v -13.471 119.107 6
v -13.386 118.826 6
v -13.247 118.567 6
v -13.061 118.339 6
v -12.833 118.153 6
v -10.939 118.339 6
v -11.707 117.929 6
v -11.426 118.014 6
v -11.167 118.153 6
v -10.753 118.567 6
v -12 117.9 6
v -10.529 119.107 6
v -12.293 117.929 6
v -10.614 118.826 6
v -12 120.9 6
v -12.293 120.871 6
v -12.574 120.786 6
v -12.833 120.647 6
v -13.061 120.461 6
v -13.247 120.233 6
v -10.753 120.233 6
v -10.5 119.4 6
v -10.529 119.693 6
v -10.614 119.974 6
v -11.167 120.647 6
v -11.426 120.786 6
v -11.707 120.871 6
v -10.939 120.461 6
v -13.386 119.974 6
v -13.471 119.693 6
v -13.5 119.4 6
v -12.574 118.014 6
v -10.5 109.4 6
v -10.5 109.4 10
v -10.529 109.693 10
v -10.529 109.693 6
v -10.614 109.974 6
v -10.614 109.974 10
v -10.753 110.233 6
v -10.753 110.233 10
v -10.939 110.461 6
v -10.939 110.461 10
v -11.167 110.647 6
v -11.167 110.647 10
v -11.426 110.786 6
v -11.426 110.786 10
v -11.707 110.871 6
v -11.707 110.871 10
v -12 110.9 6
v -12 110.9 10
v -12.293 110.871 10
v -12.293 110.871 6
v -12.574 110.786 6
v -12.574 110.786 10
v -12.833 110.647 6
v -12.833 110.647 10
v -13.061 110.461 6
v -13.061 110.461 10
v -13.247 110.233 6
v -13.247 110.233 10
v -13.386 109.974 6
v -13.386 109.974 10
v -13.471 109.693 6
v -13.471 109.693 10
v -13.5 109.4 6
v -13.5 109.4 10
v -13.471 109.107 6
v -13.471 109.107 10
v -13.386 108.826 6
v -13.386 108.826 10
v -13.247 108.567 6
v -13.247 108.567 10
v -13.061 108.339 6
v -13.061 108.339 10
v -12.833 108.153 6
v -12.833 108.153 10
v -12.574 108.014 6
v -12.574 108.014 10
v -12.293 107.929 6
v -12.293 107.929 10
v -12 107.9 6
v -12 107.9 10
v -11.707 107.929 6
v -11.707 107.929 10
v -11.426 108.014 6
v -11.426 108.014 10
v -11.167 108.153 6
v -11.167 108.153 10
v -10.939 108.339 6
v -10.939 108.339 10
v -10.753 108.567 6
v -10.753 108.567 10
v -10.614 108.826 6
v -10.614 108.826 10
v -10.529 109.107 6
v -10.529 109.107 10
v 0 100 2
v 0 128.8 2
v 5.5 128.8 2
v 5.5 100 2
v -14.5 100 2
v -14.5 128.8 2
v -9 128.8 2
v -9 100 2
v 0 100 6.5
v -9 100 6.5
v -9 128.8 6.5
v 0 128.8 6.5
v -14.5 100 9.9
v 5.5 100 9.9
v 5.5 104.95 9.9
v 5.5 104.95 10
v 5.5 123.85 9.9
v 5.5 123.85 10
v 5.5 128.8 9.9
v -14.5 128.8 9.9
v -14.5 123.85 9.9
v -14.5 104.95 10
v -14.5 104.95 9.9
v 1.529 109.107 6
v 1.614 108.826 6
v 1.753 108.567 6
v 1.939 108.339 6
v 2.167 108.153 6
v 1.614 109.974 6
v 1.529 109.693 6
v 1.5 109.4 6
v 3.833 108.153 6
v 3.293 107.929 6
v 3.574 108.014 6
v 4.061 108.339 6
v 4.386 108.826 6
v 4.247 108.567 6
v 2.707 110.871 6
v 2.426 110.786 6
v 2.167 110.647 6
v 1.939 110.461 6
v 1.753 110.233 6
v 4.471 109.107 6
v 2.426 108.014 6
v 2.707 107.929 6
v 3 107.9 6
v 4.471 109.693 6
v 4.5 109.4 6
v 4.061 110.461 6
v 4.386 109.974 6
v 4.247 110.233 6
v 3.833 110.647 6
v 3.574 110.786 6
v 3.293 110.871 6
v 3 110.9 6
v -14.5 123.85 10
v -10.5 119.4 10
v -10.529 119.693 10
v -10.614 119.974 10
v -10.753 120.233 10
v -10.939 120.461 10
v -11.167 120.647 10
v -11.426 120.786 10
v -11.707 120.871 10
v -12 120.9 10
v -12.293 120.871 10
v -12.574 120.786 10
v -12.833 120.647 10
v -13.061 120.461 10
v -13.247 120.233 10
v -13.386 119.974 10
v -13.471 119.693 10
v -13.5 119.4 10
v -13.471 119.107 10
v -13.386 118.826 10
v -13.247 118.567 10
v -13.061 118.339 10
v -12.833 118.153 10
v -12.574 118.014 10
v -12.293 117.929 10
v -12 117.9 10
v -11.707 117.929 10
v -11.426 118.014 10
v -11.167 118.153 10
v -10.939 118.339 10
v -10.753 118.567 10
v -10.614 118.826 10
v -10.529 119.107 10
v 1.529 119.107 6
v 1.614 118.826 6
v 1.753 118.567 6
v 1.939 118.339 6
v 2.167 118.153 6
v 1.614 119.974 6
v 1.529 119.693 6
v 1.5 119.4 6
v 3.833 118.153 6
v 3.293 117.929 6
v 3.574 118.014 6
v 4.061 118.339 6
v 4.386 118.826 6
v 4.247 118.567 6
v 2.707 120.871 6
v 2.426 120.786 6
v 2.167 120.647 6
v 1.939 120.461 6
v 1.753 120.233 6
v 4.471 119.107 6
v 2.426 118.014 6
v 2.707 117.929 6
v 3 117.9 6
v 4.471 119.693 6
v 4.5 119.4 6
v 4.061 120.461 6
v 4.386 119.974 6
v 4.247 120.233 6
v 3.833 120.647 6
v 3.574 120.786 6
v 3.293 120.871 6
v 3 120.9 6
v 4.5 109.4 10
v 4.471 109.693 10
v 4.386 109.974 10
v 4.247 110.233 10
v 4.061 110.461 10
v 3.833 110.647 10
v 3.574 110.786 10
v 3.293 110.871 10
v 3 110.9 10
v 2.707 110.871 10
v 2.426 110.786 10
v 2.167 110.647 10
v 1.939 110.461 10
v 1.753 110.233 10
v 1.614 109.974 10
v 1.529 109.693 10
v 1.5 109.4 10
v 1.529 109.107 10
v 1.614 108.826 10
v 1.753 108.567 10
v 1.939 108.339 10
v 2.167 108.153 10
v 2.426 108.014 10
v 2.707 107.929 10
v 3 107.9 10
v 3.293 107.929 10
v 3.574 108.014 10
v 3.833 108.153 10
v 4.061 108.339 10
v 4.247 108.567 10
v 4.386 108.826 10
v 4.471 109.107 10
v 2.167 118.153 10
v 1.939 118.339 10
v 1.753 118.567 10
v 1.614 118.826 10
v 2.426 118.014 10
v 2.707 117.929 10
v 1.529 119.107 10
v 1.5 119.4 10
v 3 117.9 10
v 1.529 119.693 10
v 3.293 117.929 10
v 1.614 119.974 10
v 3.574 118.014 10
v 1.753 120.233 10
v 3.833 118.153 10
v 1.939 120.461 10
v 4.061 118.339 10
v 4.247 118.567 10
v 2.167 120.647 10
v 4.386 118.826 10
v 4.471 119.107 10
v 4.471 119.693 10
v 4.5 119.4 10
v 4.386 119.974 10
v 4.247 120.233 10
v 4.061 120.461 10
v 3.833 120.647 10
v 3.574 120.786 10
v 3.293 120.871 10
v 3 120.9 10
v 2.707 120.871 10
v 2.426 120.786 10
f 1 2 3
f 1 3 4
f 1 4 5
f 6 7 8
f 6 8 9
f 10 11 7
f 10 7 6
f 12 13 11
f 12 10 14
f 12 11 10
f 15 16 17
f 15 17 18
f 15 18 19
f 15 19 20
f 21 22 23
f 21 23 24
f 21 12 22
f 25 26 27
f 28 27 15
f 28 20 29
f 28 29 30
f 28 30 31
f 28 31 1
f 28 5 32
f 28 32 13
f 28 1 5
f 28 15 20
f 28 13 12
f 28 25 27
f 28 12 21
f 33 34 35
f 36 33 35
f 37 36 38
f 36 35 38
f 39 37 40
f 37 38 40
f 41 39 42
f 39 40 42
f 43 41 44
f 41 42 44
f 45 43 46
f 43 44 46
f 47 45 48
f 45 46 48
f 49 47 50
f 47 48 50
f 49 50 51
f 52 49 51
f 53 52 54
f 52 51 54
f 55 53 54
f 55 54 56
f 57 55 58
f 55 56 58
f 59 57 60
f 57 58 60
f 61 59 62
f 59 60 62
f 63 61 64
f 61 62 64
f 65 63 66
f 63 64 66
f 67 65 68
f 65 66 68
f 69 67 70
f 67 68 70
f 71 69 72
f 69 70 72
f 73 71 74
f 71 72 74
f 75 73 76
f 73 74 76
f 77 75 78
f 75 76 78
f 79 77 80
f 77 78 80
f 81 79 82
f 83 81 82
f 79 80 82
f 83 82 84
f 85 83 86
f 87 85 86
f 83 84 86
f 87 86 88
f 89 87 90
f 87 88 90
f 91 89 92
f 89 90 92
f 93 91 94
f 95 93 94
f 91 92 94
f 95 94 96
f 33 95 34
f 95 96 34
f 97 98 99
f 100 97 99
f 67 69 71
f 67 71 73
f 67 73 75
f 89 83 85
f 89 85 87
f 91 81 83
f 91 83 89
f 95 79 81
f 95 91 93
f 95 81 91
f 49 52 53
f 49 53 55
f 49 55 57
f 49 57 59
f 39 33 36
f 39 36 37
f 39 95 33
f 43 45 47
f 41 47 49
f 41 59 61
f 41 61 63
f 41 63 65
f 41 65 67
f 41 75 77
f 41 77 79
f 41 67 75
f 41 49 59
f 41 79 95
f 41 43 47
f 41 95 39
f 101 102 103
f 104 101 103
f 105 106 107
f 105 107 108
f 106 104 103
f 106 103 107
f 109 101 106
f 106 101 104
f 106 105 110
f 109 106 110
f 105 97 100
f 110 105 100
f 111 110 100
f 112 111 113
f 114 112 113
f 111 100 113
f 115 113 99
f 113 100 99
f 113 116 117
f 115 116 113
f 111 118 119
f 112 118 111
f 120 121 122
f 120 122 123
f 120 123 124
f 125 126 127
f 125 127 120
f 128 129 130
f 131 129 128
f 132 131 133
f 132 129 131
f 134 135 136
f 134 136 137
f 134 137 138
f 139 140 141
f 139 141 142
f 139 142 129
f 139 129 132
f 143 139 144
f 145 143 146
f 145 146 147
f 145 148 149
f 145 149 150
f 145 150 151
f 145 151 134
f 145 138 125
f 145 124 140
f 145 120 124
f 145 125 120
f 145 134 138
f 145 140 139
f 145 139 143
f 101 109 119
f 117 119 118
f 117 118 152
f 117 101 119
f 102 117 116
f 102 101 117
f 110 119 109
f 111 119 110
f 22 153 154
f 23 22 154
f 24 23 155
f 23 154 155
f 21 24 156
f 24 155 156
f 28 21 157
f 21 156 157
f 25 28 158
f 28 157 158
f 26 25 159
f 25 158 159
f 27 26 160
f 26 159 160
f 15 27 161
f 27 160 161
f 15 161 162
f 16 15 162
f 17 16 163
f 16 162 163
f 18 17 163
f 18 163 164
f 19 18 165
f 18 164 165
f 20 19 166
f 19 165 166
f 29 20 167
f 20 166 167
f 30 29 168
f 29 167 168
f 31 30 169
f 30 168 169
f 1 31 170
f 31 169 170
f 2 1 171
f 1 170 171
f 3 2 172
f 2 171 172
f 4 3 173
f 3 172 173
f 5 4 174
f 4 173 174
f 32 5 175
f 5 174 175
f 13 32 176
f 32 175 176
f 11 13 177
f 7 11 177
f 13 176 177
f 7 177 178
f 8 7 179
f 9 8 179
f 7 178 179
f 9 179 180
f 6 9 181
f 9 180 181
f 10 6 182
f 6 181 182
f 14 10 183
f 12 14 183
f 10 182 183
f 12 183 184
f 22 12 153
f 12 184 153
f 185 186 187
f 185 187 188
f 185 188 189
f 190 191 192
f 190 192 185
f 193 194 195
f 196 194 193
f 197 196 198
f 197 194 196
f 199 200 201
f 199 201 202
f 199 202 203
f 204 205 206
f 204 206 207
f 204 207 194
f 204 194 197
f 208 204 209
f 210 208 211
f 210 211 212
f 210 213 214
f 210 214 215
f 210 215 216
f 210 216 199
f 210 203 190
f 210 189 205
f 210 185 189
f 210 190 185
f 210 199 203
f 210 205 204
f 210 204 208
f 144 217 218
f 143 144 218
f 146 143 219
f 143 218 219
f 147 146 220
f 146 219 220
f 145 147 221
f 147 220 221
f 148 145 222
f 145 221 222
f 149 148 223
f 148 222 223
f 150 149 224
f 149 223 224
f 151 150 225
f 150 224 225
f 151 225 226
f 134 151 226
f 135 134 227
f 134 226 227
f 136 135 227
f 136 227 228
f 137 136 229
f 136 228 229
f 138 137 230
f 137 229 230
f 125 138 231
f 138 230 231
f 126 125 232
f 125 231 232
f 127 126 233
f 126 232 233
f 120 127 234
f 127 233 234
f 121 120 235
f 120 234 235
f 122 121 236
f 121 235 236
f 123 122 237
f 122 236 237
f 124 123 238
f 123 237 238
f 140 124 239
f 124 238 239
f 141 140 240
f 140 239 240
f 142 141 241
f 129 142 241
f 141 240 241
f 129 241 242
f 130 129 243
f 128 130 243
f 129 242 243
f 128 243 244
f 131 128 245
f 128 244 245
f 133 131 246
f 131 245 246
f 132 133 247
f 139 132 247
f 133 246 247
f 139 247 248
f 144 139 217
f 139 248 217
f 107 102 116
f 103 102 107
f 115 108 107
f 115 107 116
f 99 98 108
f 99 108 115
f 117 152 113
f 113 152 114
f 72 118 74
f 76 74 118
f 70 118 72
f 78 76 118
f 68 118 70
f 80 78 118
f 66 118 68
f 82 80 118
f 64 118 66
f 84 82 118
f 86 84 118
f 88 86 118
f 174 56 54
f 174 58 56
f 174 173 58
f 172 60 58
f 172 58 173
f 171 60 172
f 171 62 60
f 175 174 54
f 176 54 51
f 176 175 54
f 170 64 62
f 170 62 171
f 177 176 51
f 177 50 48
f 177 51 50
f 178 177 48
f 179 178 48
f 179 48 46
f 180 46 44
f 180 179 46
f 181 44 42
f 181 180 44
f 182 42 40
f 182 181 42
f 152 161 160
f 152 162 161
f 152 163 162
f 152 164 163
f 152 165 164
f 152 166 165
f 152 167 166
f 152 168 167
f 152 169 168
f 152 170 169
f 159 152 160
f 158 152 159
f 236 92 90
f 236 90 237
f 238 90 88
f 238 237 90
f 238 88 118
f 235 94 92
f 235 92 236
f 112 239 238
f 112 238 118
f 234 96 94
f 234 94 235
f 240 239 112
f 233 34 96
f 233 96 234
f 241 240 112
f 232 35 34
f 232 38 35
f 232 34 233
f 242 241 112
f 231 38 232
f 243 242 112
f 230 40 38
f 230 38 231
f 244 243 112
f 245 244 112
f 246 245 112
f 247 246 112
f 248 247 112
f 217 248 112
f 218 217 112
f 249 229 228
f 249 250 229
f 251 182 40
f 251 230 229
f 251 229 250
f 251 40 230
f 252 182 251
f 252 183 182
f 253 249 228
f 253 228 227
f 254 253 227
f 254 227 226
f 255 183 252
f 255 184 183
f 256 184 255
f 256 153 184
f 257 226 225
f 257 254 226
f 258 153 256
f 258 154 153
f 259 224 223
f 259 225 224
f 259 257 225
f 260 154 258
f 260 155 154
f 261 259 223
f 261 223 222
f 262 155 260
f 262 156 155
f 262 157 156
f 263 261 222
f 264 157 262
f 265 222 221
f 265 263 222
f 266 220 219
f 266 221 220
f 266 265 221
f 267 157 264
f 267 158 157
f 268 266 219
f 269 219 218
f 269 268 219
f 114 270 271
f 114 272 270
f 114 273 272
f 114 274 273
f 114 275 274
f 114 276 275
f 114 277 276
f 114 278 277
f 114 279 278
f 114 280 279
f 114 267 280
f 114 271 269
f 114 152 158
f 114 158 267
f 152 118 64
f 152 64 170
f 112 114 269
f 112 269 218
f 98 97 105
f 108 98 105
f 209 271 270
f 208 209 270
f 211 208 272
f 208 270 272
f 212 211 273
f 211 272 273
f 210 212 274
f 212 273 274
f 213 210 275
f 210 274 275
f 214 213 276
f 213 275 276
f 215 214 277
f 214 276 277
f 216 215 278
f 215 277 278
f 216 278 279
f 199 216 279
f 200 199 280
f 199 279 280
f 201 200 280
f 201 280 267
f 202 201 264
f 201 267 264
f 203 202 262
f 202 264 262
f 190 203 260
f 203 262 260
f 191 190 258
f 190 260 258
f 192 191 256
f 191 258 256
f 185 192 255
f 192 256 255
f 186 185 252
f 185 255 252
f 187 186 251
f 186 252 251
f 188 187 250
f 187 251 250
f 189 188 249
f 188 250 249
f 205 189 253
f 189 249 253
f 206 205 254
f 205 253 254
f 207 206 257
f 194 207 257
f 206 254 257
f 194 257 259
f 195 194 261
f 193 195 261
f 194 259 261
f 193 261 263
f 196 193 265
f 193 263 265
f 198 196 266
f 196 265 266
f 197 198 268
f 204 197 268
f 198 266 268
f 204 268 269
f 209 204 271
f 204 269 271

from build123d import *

# Parameters (mm, degrees)
SKETCH038_W     = 20
SKETCH038_H     = 28.8
PAD013_DEPTH    = 8
SKETCH039_W     = 9
SKETCH039_H     = 4.5
POCKET025_DEPTH = 28.8
SKETCH040_R     = 1.5
POCKET023_DEPTH = 4
SKETCH041_W     = 20
SKETCH041_H     = 4.95
POCKET026_DEPTH = 0.1


with BuildPart() as part:
    # Sketch038 → Pad013 (new body)
    with BuildSketch(Plane.XY):
        with Locations((-4.5, 14.4)):
            Rectangle(SKETCH038_W, SKETCH038_H)
    extrude(amount=PAD013_DEPTH)

    # Sketch039 (on Face1 of Pad013) → Pocket025 (cut)
    with BuildSketch(Plane.XZ):
        with Locations((-4.5, 2.25)):
            Rectangle(SKETCH039_W, SKETCH039_H)
    extrude(amount=-POCKET025_DEPTH, mode=Mode.SUBTRACT)

    # Sketch040 (on Face8 of Pocket025) → Pocket023 (cut)
    with BuildSketch(Plane.XY.offset(8)):
        with Locations((-12, 19.4)):
            Circle(SKETCH040_R)
        with Locations((3, 9.4)):
            Circle(SKETCH040_R)
        with Locations((-12, 9.4)):
            Circle(SKETCH040_R)
        with Locations((3, 19.4)):
            Circle(SKETCH040_R)
    extrude(amount=-POCKET023_DEPTH, mode=Mode.SUBTRACT)

    # Sketch041 (on Face8 of Pocket023) → Pocket026 (cut)
    with BuildSketch(Plane.XY.offset(8)):
        with Locations((-4.5, 26.325)):
            Rectangle(SKETCH041_W, SKETCH041_H)
        with Locations((-4.5, 2.475)):
            Rectangle(SKETCH041_W, SKETCH041_H)
    extrude(amount=-POCKET026_DEPTH, mode=Mode.SUBTRACT)


with BuildPart() as part_1:
    # Body014 placement: moved
    add(part.part.moved(Location((0, 100, 2))))


solid = part_1.part
